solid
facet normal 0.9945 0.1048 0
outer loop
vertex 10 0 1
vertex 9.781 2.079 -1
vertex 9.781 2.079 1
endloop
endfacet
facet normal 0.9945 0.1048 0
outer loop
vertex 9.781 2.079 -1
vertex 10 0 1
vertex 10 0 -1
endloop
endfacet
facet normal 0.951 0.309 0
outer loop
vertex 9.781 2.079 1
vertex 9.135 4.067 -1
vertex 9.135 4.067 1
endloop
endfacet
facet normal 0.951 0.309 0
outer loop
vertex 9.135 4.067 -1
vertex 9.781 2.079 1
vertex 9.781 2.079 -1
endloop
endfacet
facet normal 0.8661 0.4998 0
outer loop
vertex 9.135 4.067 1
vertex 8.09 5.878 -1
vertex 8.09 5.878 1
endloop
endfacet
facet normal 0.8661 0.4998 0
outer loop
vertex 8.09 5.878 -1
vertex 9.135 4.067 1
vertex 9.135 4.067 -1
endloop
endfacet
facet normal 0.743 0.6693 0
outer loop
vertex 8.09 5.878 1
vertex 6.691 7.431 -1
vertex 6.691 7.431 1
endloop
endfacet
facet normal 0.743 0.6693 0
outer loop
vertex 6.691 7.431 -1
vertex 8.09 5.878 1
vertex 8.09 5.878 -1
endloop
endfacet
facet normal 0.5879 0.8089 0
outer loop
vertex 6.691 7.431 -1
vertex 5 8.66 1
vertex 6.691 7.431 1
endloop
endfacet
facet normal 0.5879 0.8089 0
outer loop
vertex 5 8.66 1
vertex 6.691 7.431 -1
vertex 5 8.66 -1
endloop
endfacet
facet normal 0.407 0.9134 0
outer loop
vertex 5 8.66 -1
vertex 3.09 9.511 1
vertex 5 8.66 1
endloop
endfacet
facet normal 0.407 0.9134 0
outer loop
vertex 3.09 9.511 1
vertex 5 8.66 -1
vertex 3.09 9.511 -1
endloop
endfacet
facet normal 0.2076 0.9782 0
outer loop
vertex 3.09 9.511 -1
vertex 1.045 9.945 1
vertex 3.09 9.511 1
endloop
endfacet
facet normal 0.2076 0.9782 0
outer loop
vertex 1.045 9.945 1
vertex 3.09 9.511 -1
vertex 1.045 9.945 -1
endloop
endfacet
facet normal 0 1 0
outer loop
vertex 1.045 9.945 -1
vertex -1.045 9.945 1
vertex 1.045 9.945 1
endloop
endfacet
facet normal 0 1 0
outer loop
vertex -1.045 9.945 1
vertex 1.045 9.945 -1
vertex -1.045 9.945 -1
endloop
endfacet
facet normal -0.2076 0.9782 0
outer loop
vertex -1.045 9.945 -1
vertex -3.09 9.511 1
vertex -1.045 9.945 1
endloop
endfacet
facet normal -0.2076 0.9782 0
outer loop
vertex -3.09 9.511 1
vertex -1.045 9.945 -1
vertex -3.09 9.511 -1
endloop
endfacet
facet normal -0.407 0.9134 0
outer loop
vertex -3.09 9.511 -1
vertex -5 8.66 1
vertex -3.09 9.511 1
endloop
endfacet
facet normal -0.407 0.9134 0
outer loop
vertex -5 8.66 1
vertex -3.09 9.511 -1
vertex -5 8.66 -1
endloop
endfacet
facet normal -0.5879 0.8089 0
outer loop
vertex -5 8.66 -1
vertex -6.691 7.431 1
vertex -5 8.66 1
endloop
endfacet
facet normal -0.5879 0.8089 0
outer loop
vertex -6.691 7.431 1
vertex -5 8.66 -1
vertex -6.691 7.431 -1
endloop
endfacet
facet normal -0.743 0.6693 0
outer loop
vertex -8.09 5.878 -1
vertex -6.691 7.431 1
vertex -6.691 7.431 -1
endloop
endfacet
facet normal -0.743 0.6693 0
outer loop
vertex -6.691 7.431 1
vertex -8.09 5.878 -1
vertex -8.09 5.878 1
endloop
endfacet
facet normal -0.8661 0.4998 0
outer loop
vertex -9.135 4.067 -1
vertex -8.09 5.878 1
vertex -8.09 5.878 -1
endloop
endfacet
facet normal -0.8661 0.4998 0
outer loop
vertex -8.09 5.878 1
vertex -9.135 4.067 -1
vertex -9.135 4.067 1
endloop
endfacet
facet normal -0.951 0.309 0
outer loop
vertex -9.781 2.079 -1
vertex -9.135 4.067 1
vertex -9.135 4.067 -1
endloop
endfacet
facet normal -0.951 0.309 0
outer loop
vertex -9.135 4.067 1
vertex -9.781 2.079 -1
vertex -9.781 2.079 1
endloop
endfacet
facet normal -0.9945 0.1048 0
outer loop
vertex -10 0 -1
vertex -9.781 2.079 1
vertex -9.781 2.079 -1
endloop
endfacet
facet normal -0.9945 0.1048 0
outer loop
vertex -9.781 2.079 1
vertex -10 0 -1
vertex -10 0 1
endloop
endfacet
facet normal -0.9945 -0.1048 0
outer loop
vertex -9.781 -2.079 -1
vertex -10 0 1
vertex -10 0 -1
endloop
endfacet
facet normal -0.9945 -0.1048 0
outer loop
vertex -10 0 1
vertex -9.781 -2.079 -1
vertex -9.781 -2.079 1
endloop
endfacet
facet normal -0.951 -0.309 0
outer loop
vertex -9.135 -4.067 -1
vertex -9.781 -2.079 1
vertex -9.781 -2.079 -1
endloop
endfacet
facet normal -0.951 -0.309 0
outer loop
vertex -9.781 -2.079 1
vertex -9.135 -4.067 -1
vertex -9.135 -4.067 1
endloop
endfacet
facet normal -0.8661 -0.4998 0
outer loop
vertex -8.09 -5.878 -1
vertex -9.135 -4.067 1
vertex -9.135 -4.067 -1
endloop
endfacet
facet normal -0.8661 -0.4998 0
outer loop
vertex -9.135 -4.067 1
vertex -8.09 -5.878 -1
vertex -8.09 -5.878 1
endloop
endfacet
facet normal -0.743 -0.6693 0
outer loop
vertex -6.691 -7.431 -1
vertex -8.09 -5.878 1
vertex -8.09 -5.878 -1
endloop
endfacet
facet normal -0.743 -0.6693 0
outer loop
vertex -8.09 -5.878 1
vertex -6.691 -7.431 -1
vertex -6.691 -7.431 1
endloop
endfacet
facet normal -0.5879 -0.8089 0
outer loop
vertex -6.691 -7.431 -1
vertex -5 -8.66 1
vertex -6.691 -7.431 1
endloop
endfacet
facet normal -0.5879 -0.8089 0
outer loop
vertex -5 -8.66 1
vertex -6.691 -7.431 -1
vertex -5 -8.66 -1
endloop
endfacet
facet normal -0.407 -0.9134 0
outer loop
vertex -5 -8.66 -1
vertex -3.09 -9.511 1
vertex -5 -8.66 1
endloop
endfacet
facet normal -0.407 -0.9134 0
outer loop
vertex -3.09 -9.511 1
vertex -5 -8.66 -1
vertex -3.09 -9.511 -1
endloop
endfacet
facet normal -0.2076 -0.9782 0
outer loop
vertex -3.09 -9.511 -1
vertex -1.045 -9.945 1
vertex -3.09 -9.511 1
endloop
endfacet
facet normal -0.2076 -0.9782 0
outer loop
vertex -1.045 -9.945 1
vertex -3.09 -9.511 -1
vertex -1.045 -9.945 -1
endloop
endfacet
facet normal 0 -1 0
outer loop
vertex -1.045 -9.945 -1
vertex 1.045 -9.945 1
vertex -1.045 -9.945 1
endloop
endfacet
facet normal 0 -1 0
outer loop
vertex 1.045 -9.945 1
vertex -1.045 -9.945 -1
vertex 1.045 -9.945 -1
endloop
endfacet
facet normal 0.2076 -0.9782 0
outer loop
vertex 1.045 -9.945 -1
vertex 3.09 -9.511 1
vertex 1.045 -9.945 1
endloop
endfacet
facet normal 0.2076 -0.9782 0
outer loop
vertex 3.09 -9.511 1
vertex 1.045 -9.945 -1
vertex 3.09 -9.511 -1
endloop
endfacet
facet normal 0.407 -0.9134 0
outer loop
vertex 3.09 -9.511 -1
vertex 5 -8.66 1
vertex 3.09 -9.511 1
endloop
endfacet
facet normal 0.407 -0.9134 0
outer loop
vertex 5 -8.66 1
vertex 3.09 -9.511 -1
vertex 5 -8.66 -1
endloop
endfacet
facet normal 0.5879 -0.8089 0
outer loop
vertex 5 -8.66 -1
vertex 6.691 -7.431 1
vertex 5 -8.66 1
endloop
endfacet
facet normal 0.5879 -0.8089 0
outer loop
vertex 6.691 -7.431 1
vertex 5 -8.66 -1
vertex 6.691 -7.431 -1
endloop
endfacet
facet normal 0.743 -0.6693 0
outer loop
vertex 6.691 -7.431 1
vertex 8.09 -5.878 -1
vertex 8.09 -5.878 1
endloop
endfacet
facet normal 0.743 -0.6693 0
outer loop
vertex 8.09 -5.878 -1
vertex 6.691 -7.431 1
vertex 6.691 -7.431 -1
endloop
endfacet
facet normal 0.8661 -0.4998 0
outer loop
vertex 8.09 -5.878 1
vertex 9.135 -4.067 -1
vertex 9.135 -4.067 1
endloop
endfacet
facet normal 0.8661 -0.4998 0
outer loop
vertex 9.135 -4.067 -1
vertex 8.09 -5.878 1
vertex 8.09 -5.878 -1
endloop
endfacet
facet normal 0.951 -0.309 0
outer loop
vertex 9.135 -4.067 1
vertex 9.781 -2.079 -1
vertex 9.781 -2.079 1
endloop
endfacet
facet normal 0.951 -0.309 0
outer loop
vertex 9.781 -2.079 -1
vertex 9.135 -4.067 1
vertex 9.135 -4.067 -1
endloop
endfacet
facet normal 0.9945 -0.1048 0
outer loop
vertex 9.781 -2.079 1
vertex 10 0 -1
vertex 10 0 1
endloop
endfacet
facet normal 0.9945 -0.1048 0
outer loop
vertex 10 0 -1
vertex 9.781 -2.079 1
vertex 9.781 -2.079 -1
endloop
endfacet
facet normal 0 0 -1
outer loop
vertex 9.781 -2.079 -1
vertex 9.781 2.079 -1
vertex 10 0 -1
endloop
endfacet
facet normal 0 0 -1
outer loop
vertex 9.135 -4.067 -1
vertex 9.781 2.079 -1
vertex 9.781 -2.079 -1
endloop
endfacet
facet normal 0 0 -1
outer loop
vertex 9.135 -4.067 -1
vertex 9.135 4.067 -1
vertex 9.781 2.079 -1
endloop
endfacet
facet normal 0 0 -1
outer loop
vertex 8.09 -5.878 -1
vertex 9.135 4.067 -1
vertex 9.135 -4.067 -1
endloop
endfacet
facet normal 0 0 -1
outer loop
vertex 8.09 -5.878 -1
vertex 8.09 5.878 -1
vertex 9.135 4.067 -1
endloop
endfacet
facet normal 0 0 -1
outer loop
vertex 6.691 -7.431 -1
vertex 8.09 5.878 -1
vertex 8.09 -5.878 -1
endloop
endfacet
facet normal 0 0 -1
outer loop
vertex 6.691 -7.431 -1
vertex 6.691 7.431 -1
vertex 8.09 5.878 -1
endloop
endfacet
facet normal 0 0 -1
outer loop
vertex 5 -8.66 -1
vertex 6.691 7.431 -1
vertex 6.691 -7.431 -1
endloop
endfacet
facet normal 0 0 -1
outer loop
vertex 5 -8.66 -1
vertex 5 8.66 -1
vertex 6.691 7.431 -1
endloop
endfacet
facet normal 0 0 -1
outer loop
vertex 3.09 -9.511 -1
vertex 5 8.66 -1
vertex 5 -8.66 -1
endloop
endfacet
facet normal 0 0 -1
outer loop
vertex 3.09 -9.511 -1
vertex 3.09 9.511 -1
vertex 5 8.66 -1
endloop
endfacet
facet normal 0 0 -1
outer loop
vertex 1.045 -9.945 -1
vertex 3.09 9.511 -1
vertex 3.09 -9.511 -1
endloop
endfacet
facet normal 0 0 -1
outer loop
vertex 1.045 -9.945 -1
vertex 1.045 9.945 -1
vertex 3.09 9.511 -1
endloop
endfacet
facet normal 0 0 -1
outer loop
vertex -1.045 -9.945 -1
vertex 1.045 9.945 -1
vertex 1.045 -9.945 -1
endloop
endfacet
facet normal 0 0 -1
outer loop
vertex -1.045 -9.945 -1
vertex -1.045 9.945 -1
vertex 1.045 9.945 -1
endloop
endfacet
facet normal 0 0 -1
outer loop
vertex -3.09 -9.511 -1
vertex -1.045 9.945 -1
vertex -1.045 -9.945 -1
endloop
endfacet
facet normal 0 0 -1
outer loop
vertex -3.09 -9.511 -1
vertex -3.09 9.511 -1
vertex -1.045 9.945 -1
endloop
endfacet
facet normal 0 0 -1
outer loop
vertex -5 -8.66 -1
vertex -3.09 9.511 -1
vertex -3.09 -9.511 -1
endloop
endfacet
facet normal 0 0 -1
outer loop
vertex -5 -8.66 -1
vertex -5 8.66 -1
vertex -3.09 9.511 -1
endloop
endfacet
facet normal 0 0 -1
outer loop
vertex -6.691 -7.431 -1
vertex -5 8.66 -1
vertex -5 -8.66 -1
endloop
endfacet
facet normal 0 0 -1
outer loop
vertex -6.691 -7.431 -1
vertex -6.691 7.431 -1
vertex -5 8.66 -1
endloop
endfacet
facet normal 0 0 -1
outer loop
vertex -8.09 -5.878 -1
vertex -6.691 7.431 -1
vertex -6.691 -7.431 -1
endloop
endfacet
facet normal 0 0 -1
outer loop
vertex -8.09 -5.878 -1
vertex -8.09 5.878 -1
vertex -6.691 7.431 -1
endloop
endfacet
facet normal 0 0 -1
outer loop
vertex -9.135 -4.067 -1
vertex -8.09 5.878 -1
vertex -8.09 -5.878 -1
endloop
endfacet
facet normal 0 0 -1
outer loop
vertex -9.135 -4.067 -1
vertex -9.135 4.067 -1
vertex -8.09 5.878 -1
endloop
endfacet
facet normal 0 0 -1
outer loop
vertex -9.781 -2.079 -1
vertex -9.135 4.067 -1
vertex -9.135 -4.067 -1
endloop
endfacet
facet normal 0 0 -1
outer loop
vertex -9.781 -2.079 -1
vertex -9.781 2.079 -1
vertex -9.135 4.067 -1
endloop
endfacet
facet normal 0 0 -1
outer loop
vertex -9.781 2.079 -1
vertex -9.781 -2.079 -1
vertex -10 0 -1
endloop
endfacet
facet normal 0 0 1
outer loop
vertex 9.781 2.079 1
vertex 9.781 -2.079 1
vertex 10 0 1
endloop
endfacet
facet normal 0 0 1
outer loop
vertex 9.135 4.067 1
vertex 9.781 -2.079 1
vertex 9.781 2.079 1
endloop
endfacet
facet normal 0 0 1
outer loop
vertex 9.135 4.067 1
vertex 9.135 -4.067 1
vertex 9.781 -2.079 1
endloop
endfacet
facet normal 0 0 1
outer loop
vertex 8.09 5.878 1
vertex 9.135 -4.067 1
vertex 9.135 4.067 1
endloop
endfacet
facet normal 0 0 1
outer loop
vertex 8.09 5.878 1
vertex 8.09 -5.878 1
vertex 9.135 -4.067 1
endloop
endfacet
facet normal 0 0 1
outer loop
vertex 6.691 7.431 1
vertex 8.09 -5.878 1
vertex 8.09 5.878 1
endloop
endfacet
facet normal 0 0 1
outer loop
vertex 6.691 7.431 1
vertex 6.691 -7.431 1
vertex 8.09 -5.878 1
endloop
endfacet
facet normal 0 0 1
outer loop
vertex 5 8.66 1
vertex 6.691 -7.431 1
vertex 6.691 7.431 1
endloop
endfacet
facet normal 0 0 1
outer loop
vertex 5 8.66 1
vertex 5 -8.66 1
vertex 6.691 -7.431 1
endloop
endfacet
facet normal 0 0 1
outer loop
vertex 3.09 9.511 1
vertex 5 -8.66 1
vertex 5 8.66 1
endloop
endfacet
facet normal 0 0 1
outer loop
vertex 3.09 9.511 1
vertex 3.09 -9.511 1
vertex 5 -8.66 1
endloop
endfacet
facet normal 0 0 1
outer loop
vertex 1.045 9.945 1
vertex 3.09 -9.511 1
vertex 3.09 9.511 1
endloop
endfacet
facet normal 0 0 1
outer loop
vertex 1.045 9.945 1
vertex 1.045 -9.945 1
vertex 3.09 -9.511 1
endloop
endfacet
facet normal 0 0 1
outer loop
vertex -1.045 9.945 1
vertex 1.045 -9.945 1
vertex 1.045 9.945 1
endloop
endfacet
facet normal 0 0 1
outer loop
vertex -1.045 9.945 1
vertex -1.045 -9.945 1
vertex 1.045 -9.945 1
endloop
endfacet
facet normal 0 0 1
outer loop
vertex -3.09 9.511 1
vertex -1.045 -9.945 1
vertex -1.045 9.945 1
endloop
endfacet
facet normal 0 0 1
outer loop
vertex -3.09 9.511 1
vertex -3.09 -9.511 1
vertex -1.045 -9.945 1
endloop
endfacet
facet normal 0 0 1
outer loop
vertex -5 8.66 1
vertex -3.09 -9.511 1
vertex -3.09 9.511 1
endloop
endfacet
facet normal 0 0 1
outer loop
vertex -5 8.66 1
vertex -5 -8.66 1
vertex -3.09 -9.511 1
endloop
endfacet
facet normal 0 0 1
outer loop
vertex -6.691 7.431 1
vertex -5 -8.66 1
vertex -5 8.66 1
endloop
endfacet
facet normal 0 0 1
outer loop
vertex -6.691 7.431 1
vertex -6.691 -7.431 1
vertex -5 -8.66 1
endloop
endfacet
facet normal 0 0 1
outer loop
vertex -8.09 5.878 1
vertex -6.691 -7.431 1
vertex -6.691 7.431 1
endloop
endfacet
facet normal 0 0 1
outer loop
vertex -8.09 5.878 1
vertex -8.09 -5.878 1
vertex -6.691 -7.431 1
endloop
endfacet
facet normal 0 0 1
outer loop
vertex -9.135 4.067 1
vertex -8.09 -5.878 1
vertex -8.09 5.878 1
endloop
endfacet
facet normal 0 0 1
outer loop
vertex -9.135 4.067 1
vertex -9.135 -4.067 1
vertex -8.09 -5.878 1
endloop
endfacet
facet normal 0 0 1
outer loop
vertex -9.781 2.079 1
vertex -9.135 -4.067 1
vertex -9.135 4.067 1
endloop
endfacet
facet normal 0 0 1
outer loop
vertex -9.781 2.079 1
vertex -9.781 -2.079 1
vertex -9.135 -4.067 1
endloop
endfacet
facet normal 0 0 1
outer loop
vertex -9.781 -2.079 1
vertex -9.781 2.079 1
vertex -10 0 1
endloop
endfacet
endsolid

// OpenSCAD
// Placeholder starter.scad for Accessibility Audit
// Generated to satisfy book links; replace with actual starter when available.

// Simple tactile marker example
cylinder(h=2, r=10, center=true);
